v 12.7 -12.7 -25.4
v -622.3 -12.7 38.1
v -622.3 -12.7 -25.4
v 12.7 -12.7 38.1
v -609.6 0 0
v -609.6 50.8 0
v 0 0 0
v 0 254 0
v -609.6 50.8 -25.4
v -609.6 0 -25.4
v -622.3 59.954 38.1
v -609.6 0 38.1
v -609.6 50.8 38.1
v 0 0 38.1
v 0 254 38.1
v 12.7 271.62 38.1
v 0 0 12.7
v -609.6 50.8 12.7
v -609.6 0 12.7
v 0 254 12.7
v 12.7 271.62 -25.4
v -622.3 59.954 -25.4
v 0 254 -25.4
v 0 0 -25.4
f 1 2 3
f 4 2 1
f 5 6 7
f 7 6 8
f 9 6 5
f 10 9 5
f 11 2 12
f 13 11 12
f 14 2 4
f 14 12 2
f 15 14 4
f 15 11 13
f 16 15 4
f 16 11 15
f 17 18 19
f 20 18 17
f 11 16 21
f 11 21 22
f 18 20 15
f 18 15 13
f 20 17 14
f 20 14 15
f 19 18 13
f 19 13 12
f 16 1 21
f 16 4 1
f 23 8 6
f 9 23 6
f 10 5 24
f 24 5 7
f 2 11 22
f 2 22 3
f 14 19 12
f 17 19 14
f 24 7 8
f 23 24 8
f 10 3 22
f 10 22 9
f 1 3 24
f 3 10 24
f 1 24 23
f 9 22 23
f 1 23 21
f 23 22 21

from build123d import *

# Parameters (mm, degrees)
BOSS_EXTRUDE1_DEPTH      = 12.7
BOSS_EXTRUDE2_DEPTH      = 25.4
BOSS_EXTRUDE2_DEPTH_BACK = 38.1


with BuildPart() as part:
    # Sketch1 → Boss-Extrude1 (new body)
    with BuildSketch(Plane.XY):
        Polygon((0, 0), (0, 254), (-609.6, 50.8), (-609.6, 0), align=None)
    extrude(amount=BOSS_EXTRUDE1_DEPTH)

    # Sketch2 → Boss-Extrude2 (add, two sides)
    with BuildSketch(Plane.XY.offset(12.7)) as boss_extrude2_sk:
        Polygon((12.7, -12.7), (12.7, 271.620308761), (-622.3, 59.953642095), (-622.3, -12.7), align=None)
        Polygon((0, 254), (-609.6, 50.8), (-609.6, 0), (0, 0), align=None, mode=Mode.SUBTRACT)
    extrude(amount=BOSS_EXTRUDE2_DEPTH)
    extrude(boss_extrude2_sk.sketch, amount=-BOSS_EXTRUDE2_DEPTH_BACK)


solid = part.part
